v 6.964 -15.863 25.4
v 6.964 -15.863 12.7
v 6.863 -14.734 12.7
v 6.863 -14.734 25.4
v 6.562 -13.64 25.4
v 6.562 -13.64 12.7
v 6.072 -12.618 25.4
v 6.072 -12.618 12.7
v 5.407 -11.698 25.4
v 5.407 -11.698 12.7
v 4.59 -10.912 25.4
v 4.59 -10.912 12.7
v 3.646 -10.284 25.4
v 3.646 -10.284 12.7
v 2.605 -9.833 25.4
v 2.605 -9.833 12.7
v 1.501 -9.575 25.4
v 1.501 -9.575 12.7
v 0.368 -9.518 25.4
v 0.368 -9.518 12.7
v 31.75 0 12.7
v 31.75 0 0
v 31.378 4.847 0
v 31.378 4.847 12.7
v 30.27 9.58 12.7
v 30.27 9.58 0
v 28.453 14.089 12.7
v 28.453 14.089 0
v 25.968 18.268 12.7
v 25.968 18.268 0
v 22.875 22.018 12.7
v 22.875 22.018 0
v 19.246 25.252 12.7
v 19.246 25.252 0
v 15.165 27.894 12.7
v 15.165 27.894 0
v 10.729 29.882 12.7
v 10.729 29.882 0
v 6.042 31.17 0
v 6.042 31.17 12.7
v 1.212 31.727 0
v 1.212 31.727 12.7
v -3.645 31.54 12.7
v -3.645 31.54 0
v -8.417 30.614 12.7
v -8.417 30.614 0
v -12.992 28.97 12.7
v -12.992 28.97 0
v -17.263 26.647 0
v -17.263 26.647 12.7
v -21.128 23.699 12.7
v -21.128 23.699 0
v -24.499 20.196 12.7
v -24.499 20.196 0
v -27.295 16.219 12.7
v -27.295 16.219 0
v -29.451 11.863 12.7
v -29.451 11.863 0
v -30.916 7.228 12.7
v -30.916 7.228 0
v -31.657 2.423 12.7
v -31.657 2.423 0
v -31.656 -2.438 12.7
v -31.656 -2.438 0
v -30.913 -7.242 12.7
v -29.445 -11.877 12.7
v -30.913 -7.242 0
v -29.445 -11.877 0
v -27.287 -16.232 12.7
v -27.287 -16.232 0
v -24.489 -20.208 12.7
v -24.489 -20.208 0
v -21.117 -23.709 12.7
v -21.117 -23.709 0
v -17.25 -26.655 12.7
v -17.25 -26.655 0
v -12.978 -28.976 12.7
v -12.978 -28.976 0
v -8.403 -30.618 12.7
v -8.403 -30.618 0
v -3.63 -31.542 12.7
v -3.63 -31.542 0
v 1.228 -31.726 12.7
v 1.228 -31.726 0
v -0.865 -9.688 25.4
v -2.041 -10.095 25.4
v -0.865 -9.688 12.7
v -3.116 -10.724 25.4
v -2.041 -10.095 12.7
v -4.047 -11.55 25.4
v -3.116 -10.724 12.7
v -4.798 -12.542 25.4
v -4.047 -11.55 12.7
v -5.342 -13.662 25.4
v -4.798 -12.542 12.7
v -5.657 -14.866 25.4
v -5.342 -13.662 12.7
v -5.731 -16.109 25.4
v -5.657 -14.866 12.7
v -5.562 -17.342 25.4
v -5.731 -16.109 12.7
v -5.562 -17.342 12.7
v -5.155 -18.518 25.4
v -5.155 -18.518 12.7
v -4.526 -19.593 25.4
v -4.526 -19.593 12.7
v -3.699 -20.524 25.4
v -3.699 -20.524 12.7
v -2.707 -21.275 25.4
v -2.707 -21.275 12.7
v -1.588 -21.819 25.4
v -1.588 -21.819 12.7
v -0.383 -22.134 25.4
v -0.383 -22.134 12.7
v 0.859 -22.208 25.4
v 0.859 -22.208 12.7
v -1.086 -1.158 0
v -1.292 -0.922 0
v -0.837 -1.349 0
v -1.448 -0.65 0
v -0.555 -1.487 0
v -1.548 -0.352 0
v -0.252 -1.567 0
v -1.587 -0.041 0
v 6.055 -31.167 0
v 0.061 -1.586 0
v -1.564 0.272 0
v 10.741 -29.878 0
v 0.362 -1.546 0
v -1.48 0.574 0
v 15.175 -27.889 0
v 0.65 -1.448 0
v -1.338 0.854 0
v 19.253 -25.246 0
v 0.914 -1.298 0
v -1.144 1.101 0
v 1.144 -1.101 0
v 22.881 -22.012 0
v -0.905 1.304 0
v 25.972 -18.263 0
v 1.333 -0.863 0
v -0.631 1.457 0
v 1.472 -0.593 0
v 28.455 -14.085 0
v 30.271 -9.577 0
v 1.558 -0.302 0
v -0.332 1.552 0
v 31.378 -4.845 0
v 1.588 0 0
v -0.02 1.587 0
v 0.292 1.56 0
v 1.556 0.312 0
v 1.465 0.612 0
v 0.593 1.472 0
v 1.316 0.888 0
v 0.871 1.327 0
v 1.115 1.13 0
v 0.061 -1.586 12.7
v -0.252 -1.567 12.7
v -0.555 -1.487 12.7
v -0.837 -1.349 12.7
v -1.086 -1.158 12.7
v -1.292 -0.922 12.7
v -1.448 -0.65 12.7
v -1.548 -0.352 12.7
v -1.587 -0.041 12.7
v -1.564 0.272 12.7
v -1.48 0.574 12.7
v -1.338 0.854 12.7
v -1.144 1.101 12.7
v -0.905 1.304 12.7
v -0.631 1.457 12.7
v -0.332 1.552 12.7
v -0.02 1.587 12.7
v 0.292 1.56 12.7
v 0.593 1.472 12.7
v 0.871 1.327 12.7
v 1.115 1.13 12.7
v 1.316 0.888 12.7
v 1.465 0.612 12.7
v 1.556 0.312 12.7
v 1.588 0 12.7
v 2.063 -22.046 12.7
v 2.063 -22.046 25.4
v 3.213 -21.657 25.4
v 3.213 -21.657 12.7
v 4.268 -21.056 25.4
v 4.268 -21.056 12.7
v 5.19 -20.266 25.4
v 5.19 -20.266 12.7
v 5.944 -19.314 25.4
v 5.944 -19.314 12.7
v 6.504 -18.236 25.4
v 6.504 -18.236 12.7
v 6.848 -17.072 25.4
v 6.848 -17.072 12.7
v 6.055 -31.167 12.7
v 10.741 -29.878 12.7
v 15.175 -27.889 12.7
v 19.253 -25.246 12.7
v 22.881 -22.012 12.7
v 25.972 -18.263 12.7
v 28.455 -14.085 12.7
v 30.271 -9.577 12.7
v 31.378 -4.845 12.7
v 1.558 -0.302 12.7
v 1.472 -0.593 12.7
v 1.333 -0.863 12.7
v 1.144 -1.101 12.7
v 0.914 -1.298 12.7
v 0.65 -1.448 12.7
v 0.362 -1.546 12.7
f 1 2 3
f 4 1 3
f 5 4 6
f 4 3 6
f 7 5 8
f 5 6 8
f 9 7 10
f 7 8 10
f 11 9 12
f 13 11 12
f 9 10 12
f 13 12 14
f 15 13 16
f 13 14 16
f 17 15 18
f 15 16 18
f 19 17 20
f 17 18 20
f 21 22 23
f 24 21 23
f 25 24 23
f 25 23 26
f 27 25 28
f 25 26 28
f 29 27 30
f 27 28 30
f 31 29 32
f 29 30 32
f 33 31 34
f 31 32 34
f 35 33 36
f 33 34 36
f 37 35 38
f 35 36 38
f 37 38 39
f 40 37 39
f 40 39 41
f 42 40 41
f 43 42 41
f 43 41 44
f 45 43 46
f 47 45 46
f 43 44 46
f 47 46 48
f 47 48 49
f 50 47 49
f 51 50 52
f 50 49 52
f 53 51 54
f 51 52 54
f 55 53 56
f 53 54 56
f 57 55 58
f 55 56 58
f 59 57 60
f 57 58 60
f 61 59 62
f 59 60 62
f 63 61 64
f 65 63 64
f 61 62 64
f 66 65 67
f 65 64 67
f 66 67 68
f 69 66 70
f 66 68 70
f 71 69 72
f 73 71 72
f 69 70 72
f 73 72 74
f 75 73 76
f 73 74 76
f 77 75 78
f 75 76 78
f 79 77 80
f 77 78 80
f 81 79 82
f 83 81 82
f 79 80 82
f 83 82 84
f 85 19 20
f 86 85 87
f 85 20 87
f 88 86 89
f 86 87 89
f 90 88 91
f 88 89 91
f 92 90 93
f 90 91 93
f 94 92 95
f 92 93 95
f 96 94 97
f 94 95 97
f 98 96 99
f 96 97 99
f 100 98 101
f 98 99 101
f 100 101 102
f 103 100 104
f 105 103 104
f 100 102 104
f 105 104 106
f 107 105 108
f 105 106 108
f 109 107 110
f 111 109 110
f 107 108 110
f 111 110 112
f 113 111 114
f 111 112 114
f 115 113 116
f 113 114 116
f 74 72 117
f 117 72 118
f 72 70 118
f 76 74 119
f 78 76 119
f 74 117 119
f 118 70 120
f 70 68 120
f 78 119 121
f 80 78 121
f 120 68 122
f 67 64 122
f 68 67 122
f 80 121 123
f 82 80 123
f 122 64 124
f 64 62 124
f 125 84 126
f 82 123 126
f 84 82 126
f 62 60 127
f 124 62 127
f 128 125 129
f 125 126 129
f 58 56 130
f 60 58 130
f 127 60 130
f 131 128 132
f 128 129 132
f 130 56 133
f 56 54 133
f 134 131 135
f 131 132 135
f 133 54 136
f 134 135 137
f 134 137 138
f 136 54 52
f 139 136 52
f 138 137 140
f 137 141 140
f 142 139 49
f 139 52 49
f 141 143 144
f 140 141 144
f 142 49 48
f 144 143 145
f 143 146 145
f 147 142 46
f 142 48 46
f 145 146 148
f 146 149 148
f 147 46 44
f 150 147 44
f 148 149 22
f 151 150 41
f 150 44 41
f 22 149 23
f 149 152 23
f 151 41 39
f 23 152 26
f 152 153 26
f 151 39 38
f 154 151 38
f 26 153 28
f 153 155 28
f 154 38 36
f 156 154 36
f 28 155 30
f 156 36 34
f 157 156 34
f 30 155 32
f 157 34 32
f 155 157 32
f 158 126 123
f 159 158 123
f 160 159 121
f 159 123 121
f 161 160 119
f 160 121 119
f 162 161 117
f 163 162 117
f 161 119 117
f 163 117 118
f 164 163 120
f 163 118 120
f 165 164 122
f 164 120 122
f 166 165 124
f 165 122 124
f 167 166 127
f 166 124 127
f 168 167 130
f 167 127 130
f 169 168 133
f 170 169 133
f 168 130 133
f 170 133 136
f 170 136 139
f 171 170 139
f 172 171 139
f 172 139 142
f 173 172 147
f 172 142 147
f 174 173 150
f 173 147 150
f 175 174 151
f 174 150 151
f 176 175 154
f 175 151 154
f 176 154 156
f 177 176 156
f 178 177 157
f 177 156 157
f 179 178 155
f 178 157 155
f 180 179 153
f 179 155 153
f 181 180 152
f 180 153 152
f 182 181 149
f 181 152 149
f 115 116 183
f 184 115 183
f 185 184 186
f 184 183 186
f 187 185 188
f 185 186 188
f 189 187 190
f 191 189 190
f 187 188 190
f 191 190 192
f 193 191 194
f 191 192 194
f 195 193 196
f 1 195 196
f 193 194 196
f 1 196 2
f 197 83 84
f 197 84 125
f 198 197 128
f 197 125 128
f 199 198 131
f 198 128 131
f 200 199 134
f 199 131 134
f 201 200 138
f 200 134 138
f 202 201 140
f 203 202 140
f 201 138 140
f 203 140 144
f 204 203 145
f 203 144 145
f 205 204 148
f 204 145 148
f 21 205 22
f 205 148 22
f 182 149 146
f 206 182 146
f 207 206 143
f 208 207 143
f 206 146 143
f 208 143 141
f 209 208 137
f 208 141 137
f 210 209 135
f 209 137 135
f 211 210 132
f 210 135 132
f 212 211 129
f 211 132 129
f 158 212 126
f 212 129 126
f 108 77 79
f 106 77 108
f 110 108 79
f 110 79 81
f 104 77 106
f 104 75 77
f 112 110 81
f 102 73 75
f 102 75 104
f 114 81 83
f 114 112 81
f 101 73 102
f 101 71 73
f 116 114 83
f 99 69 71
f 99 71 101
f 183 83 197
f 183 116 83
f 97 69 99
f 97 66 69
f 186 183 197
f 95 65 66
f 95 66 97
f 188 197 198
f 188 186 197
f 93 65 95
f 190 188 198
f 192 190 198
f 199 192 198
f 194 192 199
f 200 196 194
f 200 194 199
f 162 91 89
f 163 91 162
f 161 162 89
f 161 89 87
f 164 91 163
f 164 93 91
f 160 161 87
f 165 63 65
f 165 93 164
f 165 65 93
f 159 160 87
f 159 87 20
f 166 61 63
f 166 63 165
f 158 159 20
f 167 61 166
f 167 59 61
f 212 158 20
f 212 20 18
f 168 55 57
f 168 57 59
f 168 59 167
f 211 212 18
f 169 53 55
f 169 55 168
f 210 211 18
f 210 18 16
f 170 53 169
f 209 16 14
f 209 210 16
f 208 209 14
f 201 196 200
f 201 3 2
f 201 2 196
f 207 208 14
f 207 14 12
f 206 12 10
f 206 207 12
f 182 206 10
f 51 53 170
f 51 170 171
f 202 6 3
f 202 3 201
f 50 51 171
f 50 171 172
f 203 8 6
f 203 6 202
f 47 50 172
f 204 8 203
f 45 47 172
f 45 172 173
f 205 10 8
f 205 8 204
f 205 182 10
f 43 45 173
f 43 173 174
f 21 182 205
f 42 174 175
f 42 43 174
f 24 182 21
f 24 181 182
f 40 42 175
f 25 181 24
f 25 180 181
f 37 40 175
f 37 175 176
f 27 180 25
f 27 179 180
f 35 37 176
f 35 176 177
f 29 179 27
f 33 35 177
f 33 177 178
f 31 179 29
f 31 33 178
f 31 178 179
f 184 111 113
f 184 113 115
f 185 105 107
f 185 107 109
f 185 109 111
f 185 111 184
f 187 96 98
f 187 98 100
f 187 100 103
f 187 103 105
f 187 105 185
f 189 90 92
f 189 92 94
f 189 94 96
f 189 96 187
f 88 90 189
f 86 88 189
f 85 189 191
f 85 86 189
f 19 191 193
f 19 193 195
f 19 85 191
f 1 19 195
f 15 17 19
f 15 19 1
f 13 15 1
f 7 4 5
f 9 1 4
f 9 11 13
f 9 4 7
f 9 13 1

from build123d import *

# Parameters (mm, degrees)
F1_DEPTH = 12.7
F2_DEPTH = 25.4


with BuildPart() as f1:
    # F0 (on Top) → F1 (new body)
    with BuildSketch(Plane.XY):
        with BuildLine():
            ThreePointArc((1.5875, 0), (-1.144027, 1.100617), (0.061379, -1.586313))
            ThreePointArc((0.061379, -1.586313), (1.144027, -1.100617), (1.5875, 0))
        make_face()
        with BuildLine():
            ThreePointArc((1.227574, -31.72626), (22.880537, -22.012349), (31.75, 0))
            ThreePointArc((31.75, 0), (-22.880537, 22.012349), (1.227574, -31.72626))
        make_face()
        with BuildLine():
            ThreePointArc((6.963787, -15.86313), (5.189894, -20.2656), (0.859301, -22.208382))
            ThreePointArc((0.859301, -22.208382), (-5.731465, -16.108645), (0.368272, -9.517878))
            ThreePointArc((0.368272, -9.517878), (5.016257, -11.287022), (6.963787, -15.86313))
        make_face(mode=Mode.SUBTRACT)
        with BuildLine():
            ThreePointArc((1.5875, 0), (1.144027, -1.100617), (0.061379, -1.586313))
            ThreePointArc((0.061379, -1.586313), (-1.144027, 1.100617), (1.5875, 0))
        make_face(mode=Mode.SUBTRACT)
    extrude(amount=F1_DEPTH)

    # F0 (on Top) → F2 (join)
    with BuildSketch(Plane.XY):
        with BuildLine():
            Line((0.368272, -9.517878), (0.859301, -22.208382))
            ThreePointArc((0.859301, -22.208382), (5.189894, -20.2656), (6.963787, -15.86313))
            ThreePointArc((6.963787, -15.86313), (5.016257, -11.287022), (0.368272, -9.517878))
        make_face()
        with BuildLine():
            ThreePointArc((0.368272, -9.517878), (-5.731465, -16.108645), (0.859301, -22.208382))
            Line((0.859301, -22.208382), (0.368272, -9.517878))
        make_face()
    extrude(amount=F2_DEPTH)


solid = f1.part
